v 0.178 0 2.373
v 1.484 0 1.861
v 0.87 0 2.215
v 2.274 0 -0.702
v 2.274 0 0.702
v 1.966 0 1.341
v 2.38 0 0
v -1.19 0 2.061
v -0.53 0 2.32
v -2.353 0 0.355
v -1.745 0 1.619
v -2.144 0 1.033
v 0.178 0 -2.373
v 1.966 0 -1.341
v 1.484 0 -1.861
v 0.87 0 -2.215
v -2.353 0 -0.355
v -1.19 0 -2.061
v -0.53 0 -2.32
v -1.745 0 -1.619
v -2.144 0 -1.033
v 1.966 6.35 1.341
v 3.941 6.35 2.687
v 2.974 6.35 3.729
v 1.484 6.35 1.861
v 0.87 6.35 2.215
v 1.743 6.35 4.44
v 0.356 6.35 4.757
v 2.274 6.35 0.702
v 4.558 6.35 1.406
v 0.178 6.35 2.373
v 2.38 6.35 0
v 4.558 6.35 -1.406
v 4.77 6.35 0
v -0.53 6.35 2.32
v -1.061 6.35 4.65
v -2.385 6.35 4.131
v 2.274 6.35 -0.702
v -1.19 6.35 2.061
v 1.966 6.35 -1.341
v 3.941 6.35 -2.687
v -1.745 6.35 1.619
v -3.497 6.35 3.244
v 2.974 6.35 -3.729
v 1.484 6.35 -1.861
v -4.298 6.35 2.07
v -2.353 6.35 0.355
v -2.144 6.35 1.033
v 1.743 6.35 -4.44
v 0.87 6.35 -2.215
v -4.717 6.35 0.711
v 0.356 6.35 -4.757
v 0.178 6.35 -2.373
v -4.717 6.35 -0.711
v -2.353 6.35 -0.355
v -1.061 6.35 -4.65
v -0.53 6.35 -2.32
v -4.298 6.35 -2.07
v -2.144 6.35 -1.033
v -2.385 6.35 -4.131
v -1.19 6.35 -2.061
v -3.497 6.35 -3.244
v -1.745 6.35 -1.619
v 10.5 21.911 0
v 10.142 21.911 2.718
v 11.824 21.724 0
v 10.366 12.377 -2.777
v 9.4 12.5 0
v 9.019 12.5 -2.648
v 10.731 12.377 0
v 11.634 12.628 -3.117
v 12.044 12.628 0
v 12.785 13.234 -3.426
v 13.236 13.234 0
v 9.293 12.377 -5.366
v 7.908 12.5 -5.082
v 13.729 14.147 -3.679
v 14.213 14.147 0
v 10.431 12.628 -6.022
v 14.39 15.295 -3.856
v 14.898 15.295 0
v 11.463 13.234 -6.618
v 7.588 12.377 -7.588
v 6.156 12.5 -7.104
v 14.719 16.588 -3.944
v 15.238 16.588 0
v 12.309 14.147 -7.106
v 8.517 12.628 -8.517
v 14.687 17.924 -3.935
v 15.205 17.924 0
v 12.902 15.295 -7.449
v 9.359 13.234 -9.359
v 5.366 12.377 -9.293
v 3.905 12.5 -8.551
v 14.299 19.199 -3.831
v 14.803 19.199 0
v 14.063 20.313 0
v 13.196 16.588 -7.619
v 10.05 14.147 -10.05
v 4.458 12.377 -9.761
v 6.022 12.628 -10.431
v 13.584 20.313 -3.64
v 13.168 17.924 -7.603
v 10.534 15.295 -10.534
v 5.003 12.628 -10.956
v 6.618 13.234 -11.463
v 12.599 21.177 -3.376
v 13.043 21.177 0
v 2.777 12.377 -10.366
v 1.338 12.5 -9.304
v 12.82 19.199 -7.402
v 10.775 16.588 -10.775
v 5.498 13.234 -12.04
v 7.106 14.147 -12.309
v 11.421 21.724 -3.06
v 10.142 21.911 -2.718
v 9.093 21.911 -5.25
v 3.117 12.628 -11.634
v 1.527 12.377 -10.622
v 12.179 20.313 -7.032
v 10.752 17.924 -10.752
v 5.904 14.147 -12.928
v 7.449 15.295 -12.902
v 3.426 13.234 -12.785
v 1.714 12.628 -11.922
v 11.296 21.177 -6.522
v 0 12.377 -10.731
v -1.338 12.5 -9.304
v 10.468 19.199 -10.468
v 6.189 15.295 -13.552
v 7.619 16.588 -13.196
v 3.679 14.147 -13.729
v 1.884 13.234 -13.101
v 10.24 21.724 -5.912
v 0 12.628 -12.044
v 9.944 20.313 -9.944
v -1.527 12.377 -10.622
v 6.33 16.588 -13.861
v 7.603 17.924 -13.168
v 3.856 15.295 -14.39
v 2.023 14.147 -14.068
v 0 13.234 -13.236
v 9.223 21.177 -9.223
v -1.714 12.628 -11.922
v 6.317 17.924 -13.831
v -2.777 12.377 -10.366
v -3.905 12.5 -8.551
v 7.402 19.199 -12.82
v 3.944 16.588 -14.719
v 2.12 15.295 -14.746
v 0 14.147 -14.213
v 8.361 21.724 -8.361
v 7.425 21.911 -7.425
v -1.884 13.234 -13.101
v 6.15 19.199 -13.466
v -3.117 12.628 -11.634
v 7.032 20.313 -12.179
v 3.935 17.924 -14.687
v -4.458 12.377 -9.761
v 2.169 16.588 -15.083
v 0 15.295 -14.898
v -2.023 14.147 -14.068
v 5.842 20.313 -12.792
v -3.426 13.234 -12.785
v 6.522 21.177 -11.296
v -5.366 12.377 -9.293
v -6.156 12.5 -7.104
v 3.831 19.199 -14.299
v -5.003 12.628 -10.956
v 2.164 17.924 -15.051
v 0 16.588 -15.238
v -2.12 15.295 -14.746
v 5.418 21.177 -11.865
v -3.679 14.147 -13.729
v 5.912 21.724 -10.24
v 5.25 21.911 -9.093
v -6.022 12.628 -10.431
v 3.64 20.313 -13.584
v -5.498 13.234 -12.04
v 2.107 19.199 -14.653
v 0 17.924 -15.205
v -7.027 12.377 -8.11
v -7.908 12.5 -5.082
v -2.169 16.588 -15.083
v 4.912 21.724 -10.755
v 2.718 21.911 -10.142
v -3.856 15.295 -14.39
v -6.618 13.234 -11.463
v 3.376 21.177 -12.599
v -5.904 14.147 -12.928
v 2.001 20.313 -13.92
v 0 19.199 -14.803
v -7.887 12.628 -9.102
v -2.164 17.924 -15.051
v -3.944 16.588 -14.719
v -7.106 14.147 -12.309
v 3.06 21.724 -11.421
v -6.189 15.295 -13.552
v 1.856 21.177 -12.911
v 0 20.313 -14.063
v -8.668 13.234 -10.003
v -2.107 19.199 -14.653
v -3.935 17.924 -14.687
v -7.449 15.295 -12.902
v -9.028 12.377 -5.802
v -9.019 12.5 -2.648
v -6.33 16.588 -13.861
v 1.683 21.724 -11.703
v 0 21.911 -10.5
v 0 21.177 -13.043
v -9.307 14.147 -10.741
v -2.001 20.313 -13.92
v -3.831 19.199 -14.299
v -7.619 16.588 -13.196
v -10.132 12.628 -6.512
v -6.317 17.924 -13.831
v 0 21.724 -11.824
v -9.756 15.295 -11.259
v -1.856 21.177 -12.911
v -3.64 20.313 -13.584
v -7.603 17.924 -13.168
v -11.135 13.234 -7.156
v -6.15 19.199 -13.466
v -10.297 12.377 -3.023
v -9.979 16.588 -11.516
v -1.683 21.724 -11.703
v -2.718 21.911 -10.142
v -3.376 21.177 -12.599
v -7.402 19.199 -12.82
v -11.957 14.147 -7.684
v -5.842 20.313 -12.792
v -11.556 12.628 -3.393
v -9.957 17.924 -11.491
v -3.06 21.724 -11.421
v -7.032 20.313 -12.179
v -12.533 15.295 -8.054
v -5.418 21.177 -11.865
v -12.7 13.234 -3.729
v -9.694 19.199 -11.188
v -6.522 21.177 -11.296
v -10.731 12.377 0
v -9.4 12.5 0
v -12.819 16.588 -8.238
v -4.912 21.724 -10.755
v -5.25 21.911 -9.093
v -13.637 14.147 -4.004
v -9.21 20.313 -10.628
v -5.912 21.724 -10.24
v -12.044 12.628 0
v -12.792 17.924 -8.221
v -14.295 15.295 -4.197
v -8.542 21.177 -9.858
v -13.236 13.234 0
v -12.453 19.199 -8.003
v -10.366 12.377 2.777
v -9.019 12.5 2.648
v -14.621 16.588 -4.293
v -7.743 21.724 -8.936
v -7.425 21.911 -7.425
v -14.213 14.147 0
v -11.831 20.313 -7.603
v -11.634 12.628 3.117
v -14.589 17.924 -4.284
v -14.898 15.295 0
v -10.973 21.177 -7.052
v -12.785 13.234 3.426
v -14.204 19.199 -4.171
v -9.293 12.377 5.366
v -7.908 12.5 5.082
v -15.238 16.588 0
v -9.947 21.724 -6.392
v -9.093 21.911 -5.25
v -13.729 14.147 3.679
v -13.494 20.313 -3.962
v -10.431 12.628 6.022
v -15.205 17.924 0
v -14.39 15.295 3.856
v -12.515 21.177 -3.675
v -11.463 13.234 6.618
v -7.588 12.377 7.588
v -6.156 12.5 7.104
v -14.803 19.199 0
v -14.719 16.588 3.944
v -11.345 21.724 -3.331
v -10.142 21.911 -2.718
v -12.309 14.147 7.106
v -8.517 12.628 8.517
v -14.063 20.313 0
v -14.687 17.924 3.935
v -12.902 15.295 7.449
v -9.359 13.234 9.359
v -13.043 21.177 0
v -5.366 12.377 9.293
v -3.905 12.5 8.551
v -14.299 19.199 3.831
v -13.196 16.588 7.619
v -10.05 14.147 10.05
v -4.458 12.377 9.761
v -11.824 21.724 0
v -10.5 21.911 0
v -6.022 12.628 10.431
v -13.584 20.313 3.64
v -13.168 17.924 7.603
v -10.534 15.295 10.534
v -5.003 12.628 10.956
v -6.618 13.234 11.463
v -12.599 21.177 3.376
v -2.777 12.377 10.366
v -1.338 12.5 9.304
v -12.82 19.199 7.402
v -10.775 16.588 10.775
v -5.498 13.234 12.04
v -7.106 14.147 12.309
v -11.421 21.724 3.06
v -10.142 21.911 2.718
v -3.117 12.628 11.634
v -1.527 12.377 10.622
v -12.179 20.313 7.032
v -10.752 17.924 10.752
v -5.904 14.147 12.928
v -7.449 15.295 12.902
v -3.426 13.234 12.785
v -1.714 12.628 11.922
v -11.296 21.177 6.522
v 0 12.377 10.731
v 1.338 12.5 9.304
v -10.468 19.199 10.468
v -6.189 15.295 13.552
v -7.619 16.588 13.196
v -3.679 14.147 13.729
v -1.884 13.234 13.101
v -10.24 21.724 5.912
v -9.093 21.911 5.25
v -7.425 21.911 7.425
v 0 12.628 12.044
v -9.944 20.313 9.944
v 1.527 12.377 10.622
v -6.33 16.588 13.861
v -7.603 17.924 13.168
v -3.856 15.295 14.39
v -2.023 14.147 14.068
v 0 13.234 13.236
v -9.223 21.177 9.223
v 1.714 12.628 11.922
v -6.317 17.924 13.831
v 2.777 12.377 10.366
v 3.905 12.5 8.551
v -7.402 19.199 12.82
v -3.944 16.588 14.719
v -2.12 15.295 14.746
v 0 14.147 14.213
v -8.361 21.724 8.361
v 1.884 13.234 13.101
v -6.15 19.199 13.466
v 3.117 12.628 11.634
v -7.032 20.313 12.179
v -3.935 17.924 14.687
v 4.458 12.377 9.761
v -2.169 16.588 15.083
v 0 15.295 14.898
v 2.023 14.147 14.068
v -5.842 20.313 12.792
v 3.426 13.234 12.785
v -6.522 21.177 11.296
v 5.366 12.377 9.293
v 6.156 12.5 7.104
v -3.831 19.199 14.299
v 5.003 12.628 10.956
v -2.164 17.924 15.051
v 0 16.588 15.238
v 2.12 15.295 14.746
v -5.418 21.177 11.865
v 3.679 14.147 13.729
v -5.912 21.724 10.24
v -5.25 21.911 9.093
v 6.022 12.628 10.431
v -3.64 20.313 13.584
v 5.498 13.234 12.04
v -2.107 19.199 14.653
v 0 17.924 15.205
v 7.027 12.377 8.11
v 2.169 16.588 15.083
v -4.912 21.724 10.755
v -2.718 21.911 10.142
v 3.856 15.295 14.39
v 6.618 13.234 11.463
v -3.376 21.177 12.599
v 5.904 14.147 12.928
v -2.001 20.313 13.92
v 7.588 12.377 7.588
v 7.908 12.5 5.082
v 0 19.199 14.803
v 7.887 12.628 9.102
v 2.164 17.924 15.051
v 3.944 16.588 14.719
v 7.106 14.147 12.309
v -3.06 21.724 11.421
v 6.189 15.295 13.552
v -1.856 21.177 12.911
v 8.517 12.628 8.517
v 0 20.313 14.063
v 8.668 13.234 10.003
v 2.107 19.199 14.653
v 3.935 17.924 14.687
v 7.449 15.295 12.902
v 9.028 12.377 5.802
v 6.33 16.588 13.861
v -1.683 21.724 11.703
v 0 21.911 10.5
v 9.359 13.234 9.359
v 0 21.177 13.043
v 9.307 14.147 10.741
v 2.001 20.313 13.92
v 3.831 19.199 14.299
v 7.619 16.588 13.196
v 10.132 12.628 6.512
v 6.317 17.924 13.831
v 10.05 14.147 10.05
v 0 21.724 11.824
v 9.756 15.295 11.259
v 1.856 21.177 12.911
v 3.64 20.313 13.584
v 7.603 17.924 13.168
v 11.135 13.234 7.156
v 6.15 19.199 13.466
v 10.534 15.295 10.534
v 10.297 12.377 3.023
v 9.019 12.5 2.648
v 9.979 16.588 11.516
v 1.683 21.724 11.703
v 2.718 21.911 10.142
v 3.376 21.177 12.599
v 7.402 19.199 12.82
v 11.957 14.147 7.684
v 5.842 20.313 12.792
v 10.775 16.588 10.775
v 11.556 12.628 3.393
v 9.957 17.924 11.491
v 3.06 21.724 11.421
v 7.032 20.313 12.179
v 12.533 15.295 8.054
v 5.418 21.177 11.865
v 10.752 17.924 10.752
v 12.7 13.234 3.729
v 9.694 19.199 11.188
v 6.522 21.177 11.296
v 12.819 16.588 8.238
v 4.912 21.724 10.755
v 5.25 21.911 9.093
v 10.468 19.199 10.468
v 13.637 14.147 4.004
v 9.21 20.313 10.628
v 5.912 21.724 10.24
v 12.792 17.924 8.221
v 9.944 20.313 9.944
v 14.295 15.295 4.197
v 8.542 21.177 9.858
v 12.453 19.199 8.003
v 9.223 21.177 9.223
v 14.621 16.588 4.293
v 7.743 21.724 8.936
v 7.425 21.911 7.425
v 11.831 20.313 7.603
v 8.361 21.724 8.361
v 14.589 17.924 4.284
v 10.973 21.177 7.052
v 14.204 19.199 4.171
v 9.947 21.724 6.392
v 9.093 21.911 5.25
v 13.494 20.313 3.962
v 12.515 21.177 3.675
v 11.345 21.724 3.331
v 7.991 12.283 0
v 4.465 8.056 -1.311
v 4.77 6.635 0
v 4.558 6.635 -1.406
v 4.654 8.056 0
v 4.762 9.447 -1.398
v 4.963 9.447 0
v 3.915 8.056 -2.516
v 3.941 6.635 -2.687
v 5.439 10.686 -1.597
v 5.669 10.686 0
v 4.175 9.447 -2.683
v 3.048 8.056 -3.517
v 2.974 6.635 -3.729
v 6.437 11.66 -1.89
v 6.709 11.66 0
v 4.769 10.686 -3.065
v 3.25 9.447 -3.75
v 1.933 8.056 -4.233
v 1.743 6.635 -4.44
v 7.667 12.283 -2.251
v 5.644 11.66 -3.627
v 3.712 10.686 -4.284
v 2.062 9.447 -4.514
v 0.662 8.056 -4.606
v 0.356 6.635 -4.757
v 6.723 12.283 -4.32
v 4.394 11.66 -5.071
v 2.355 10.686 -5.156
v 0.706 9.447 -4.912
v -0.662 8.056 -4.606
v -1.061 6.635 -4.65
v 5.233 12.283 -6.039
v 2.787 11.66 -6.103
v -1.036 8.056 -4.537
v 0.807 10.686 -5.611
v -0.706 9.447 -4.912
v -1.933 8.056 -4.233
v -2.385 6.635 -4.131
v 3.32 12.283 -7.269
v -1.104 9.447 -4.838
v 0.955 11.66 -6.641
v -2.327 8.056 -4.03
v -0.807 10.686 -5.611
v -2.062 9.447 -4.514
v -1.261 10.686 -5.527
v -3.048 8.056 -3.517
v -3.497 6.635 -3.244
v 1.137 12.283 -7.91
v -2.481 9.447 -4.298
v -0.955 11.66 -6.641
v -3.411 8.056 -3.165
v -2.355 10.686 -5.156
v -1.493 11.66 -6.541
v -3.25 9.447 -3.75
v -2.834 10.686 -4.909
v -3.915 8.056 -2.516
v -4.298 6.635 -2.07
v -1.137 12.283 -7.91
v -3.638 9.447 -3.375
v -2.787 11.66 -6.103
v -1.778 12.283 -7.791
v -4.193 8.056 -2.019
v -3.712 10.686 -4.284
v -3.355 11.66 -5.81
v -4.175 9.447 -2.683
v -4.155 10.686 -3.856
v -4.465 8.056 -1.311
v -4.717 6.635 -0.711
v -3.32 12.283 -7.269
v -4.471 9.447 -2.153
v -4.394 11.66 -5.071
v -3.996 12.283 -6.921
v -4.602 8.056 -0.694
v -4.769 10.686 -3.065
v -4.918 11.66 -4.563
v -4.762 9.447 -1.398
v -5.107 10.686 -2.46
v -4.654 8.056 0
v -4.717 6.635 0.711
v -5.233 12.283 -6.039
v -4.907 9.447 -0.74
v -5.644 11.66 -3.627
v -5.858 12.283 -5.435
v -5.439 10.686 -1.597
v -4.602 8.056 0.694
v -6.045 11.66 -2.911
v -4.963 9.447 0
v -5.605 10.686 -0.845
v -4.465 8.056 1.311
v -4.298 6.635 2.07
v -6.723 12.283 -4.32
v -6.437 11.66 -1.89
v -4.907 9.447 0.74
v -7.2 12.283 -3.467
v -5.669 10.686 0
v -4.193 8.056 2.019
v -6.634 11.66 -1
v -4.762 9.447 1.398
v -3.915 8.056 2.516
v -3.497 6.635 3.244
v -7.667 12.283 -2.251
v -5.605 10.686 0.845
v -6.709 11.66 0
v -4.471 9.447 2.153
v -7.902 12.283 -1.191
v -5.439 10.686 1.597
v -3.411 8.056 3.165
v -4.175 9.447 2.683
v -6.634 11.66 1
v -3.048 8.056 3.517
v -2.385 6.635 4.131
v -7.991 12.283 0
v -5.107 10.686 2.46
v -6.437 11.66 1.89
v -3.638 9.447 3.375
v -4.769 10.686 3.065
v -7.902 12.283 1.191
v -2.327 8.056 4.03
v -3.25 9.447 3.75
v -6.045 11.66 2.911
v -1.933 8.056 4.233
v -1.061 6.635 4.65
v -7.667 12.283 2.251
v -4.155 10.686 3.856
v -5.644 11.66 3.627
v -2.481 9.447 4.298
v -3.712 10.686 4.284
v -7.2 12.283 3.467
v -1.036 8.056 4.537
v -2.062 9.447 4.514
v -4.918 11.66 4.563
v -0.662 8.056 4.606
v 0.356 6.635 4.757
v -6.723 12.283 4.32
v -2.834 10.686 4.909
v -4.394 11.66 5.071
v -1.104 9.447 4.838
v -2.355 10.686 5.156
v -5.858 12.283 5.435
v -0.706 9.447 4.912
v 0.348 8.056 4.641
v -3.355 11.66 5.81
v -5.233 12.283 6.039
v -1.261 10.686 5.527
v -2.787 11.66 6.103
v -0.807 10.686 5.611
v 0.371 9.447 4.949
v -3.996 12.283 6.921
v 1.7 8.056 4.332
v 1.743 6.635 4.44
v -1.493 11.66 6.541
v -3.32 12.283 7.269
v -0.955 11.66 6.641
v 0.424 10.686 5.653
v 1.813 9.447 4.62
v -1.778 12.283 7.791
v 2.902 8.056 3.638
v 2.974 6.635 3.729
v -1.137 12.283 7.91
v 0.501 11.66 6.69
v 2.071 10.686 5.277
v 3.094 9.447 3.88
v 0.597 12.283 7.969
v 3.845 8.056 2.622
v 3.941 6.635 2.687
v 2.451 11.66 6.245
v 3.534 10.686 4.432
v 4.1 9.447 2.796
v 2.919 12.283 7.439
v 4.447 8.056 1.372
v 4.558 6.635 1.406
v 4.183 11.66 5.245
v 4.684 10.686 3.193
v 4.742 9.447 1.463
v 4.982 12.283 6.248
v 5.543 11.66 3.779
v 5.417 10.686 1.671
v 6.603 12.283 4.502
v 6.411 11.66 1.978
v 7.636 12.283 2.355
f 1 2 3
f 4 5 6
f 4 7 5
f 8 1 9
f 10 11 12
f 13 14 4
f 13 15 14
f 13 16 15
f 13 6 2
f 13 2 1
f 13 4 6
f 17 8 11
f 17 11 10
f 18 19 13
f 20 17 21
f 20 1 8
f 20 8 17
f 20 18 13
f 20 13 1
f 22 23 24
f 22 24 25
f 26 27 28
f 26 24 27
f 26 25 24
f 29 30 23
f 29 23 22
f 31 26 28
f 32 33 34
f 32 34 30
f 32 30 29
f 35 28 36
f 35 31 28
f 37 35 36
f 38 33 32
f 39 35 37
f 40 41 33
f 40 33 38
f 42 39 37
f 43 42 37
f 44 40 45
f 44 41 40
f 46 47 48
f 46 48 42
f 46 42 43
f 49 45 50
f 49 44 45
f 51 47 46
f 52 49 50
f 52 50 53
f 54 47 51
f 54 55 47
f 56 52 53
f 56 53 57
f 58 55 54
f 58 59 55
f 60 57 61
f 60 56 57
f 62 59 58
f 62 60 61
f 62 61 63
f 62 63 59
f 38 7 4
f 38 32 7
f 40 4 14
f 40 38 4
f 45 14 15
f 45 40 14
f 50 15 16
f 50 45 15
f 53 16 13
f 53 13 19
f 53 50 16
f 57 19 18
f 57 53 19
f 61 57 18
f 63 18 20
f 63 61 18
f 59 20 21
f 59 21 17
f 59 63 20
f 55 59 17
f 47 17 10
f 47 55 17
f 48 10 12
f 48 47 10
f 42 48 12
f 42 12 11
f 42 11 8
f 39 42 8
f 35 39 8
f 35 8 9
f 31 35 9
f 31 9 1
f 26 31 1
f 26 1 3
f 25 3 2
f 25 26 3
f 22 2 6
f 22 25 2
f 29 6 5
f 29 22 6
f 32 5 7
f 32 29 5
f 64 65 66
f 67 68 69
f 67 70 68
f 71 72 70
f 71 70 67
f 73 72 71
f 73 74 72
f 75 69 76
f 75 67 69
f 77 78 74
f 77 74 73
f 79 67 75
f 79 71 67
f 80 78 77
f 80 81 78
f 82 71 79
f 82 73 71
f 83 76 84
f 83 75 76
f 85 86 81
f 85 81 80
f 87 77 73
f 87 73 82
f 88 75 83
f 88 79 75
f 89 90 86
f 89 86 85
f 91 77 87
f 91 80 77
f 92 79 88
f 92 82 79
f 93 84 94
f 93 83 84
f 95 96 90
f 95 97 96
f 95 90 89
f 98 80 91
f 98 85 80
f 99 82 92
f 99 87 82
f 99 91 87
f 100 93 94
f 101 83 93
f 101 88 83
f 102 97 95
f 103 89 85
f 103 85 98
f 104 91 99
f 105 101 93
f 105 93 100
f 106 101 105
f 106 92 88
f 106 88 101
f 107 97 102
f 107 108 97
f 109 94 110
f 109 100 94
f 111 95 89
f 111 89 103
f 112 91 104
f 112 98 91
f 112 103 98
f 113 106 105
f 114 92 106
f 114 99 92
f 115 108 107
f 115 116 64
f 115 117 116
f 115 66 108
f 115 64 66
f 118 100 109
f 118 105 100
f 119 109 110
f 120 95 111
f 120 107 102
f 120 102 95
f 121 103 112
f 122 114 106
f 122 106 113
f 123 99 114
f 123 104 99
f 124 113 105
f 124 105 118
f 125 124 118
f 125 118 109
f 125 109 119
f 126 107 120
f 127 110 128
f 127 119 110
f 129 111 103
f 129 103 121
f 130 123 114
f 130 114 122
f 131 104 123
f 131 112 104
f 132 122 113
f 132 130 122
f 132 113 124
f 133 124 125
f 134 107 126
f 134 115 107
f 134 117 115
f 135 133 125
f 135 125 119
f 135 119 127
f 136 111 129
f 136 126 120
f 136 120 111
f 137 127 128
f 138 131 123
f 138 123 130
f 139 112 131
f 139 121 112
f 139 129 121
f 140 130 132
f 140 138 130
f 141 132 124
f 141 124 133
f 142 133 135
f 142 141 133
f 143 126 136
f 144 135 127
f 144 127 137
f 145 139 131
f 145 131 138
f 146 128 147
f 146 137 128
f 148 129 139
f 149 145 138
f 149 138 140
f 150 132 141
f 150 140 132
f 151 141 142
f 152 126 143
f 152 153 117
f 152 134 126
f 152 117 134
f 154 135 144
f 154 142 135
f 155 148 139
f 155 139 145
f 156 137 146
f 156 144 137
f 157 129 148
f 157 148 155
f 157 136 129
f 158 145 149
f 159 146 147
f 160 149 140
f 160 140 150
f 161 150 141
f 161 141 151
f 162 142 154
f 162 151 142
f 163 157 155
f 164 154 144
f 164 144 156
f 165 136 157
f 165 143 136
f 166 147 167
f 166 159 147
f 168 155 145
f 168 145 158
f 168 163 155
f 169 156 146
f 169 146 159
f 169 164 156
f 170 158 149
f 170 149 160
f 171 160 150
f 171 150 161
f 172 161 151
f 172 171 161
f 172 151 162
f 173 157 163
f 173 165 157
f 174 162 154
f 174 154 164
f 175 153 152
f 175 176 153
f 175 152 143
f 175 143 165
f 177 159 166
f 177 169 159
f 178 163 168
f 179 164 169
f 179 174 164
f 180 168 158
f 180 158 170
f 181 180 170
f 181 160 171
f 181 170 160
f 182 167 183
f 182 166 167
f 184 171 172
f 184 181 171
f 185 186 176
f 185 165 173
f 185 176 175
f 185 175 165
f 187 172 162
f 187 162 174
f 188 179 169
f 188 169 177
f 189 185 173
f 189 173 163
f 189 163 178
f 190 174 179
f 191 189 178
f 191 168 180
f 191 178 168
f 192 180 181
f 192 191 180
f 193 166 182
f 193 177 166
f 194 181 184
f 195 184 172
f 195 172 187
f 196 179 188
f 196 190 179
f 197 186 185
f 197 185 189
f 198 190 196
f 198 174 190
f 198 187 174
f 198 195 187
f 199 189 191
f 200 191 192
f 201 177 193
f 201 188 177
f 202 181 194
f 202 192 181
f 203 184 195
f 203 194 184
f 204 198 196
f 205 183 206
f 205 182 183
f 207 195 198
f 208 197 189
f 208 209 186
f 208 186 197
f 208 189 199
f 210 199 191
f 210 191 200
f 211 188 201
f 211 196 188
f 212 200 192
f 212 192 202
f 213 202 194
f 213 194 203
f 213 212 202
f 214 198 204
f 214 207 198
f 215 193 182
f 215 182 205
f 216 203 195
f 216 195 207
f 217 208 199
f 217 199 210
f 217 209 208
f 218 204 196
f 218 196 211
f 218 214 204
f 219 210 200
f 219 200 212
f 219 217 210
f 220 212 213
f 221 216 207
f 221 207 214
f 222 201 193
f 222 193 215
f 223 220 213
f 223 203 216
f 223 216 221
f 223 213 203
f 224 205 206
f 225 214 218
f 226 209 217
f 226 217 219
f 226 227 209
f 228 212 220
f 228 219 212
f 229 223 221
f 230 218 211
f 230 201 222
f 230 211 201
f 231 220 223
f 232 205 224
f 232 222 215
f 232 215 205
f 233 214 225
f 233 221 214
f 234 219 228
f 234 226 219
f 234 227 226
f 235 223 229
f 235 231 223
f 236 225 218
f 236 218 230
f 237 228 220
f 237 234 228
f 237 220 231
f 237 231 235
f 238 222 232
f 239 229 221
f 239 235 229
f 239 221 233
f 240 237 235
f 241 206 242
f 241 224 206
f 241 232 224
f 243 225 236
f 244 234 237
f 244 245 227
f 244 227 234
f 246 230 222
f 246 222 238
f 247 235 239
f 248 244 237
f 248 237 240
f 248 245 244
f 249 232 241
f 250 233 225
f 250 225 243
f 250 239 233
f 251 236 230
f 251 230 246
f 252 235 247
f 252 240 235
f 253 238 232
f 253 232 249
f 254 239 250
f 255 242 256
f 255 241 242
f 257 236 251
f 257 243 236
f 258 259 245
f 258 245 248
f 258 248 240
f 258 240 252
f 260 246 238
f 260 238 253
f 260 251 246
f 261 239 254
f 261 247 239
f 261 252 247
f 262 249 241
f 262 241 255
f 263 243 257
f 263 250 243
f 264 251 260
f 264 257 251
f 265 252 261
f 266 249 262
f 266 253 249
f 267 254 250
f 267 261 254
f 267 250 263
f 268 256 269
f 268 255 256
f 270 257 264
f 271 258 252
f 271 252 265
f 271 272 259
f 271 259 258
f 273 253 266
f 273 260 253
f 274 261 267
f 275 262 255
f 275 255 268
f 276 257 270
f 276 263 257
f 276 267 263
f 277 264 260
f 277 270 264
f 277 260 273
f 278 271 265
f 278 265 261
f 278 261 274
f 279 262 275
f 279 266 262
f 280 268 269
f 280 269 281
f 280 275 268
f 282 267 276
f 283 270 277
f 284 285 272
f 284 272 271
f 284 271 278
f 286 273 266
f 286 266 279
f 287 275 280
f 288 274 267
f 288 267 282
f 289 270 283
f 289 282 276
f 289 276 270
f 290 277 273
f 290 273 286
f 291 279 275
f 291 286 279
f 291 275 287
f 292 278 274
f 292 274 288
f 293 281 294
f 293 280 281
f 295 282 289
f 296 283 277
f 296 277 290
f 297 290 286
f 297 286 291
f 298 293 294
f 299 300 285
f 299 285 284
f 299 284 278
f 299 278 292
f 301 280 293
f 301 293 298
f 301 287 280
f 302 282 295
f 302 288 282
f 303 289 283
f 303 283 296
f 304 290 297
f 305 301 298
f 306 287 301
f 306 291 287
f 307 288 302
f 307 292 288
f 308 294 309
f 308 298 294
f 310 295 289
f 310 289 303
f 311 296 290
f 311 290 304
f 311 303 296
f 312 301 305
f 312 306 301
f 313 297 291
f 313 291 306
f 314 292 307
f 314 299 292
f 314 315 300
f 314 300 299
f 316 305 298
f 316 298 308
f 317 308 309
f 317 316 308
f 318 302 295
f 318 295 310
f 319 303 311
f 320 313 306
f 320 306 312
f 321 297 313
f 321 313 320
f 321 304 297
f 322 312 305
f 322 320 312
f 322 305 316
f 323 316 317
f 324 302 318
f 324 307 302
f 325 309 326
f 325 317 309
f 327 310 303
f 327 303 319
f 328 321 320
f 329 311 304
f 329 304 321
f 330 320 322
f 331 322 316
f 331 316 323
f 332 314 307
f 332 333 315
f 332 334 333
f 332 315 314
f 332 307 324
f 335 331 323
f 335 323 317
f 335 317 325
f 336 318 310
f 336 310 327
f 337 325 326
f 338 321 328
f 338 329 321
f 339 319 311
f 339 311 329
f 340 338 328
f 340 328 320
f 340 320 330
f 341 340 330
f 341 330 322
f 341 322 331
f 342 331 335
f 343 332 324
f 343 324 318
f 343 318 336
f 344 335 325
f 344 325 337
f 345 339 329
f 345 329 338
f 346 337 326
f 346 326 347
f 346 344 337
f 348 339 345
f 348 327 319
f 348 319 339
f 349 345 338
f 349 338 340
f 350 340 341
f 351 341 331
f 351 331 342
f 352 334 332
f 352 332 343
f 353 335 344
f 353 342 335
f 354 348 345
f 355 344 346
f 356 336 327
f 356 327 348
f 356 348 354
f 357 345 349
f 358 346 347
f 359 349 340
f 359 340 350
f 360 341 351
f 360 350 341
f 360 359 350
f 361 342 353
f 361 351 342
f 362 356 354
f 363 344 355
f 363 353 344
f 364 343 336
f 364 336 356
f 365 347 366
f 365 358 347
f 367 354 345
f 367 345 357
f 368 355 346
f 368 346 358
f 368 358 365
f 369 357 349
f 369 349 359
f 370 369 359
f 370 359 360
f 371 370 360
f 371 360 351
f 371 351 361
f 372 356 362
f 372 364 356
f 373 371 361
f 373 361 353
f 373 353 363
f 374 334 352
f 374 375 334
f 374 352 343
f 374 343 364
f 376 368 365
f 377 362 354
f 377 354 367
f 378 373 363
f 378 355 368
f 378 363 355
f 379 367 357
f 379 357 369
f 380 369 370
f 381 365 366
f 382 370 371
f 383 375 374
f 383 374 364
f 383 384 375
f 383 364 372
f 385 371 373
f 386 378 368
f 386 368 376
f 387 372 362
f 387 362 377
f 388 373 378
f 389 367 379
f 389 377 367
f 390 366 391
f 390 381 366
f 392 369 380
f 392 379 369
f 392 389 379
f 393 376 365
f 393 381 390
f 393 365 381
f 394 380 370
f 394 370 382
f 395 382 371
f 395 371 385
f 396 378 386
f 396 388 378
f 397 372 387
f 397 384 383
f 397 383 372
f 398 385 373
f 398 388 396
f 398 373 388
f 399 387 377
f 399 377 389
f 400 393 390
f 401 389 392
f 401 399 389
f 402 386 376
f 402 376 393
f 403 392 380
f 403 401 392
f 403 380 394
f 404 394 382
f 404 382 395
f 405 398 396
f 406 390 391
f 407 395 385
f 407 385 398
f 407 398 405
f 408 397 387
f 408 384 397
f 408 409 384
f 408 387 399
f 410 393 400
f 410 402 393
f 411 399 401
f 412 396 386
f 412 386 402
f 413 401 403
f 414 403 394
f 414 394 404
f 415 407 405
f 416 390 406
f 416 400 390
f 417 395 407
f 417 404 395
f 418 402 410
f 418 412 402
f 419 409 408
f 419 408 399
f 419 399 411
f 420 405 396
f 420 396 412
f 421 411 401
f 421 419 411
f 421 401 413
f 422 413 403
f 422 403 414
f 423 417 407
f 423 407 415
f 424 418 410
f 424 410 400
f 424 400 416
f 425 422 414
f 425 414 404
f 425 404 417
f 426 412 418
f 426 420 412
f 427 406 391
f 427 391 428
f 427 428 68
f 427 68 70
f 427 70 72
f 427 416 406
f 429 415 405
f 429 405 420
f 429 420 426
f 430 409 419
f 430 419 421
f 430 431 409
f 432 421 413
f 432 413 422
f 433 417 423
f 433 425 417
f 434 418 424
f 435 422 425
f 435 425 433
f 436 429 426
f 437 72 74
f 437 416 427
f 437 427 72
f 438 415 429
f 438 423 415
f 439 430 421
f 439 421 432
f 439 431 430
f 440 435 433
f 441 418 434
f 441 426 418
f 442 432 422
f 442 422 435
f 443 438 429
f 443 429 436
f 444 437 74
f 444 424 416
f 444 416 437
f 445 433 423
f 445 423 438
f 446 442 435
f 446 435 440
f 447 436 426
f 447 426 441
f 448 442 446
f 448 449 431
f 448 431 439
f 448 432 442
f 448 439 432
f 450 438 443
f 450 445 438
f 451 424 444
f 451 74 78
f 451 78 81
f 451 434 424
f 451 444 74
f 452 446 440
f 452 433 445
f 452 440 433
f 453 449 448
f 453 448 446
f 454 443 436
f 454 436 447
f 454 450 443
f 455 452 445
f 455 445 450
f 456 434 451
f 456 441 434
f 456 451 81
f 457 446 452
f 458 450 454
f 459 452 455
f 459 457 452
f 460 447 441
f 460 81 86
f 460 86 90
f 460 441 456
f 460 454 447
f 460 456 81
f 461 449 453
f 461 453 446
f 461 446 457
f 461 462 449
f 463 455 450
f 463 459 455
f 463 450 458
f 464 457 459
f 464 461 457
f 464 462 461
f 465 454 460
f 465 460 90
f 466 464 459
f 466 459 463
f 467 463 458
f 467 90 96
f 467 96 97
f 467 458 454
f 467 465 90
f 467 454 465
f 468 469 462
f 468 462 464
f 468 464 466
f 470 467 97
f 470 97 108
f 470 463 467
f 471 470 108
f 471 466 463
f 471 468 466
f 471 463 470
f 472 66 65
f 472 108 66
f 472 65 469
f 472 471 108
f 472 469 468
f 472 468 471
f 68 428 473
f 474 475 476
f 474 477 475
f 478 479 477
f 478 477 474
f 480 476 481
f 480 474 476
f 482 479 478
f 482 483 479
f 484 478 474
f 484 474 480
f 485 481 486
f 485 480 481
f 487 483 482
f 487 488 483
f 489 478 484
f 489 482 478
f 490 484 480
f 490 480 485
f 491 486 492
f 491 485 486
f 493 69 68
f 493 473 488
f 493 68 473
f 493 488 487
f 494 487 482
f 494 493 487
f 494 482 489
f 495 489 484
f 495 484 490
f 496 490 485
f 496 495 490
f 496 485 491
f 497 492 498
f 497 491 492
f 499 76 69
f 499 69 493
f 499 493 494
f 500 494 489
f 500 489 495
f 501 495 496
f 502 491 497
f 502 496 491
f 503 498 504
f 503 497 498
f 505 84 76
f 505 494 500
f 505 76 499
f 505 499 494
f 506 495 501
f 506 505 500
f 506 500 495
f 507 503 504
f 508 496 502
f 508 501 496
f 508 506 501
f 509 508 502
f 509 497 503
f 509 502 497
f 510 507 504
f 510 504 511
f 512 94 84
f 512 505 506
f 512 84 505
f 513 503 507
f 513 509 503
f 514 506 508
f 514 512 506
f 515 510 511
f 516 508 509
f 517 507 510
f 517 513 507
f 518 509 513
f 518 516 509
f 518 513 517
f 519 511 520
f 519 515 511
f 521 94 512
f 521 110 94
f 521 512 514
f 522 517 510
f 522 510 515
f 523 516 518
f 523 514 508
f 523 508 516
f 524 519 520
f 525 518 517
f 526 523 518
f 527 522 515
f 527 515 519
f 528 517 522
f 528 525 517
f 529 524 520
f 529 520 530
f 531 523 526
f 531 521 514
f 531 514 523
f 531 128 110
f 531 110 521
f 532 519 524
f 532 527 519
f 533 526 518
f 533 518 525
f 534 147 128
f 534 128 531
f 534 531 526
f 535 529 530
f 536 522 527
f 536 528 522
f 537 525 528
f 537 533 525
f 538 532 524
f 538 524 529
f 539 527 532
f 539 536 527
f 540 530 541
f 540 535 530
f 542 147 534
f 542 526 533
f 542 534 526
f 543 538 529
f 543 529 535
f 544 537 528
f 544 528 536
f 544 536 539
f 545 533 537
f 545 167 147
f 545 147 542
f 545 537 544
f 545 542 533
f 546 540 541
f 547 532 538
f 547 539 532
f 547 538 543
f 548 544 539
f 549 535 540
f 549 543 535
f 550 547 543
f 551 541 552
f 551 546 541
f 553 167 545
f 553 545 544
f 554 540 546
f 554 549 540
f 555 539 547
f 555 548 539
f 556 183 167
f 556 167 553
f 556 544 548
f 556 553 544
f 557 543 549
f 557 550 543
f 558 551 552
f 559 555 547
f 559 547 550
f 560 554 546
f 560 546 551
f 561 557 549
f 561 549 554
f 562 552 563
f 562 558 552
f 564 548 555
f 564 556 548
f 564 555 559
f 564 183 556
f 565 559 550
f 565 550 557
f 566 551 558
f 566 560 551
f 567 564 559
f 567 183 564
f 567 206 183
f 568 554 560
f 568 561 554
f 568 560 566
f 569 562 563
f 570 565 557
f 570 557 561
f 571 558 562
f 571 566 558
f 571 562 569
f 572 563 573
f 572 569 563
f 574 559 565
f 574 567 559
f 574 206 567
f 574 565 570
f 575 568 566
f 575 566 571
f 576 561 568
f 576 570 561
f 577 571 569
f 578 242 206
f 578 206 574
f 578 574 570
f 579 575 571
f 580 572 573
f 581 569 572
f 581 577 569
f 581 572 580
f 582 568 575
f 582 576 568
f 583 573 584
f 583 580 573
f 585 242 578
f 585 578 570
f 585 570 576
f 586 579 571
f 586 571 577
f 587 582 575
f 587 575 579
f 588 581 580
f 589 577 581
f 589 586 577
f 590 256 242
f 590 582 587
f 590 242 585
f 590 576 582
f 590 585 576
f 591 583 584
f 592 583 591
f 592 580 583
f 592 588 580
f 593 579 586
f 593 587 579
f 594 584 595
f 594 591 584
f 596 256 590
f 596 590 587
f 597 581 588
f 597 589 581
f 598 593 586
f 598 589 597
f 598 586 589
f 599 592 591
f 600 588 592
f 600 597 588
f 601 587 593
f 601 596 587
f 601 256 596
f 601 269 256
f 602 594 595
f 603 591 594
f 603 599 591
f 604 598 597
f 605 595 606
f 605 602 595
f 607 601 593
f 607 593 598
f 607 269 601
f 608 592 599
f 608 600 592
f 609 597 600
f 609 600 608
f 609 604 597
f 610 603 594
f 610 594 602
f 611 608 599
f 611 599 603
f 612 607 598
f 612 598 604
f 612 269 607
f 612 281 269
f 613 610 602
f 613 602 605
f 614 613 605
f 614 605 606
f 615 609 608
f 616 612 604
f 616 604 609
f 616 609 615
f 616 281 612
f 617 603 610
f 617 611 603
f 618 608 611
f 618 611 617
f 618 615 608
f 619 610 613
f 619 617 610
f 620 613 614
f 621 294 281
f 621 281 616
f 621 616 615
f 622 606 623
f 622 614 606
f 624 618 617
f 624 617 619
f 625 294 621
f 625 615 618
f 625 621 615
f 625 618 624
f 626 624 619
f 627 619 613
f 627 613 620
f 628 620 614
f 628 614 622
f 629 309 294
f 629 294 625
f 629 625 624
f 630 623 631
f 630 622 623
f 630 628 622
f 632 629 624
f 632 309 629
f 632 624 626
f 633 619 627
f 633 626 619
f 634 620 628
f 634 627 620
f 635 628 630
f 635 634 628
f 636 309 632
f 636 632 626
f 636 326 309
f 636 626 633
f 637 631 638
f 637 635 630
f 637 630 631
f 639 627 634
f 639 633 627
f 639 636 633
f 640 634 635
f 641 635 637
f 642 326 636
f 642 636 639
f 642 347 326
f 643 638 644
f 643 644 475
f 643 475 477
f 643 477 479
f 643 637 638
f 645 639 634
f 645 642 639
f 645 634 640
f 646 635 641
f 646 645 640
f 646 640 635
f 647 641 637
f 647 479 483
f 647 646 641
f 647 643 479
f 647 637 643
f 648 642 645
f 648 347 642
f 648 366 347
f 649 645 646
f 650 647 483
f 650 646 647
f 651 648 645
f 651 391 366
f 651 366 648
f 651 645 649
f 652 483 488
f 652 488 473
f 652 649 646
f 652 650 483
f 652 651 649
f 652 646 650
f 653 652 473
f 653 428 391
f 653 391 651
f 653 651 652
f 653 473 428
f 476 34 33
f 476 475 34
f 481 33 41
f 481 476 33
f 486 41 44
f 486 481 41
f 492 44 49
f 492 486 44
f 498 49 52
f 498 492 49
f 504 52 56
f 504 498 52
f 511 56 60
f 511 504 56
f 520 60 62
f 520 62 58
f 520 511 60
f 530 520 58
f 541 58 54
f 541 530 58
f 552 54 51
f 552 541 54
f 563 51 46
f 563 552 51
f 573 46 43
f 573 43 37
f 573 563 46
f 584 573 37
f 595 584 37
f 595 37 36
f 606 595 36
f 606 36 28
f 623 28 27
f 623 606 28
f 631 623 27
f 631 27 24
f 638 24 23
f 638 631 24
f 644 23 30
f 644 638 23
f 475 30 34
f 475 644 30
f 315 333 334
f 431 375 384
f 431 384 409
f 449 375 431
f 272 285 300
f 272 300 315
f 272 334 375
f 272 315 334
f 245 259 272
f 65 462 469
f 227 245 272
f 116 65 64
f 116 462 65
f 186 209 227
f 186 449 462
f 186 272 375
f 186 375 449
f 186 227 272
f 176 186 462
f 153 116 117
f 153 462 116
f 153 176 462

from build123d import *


with BuildPart() as part:
    # Sketch1 → Revolve1 (revolve)
    with BuildSketch(Plane.XY):
        with BuildLine():
            Line((0, 0), (2.38, 0))
            Line((2.38, 0), (2.38, 6.35))
            Line((2.38, 6.35), (4.77, 6.35))
            Line((4.77, 6.35), (4.77, 6.635226112))
            ThreePointArc((4.77, 6.635226112), (5.668747391, 10.685686779), (9.4, 12.5))
            ThreePointArc((9.4, 12.5), (15.237749216, 16.587689011), (10.5, 21.911432968))
            Line((10.5, 21.911432968), (0, 21.911432968))
            Line((0, 21.911432968), (0, 0))
        make_face()
    revolve(axis=Axis((0, 0, 0), (0, 1, 0)))


solid = part.part
